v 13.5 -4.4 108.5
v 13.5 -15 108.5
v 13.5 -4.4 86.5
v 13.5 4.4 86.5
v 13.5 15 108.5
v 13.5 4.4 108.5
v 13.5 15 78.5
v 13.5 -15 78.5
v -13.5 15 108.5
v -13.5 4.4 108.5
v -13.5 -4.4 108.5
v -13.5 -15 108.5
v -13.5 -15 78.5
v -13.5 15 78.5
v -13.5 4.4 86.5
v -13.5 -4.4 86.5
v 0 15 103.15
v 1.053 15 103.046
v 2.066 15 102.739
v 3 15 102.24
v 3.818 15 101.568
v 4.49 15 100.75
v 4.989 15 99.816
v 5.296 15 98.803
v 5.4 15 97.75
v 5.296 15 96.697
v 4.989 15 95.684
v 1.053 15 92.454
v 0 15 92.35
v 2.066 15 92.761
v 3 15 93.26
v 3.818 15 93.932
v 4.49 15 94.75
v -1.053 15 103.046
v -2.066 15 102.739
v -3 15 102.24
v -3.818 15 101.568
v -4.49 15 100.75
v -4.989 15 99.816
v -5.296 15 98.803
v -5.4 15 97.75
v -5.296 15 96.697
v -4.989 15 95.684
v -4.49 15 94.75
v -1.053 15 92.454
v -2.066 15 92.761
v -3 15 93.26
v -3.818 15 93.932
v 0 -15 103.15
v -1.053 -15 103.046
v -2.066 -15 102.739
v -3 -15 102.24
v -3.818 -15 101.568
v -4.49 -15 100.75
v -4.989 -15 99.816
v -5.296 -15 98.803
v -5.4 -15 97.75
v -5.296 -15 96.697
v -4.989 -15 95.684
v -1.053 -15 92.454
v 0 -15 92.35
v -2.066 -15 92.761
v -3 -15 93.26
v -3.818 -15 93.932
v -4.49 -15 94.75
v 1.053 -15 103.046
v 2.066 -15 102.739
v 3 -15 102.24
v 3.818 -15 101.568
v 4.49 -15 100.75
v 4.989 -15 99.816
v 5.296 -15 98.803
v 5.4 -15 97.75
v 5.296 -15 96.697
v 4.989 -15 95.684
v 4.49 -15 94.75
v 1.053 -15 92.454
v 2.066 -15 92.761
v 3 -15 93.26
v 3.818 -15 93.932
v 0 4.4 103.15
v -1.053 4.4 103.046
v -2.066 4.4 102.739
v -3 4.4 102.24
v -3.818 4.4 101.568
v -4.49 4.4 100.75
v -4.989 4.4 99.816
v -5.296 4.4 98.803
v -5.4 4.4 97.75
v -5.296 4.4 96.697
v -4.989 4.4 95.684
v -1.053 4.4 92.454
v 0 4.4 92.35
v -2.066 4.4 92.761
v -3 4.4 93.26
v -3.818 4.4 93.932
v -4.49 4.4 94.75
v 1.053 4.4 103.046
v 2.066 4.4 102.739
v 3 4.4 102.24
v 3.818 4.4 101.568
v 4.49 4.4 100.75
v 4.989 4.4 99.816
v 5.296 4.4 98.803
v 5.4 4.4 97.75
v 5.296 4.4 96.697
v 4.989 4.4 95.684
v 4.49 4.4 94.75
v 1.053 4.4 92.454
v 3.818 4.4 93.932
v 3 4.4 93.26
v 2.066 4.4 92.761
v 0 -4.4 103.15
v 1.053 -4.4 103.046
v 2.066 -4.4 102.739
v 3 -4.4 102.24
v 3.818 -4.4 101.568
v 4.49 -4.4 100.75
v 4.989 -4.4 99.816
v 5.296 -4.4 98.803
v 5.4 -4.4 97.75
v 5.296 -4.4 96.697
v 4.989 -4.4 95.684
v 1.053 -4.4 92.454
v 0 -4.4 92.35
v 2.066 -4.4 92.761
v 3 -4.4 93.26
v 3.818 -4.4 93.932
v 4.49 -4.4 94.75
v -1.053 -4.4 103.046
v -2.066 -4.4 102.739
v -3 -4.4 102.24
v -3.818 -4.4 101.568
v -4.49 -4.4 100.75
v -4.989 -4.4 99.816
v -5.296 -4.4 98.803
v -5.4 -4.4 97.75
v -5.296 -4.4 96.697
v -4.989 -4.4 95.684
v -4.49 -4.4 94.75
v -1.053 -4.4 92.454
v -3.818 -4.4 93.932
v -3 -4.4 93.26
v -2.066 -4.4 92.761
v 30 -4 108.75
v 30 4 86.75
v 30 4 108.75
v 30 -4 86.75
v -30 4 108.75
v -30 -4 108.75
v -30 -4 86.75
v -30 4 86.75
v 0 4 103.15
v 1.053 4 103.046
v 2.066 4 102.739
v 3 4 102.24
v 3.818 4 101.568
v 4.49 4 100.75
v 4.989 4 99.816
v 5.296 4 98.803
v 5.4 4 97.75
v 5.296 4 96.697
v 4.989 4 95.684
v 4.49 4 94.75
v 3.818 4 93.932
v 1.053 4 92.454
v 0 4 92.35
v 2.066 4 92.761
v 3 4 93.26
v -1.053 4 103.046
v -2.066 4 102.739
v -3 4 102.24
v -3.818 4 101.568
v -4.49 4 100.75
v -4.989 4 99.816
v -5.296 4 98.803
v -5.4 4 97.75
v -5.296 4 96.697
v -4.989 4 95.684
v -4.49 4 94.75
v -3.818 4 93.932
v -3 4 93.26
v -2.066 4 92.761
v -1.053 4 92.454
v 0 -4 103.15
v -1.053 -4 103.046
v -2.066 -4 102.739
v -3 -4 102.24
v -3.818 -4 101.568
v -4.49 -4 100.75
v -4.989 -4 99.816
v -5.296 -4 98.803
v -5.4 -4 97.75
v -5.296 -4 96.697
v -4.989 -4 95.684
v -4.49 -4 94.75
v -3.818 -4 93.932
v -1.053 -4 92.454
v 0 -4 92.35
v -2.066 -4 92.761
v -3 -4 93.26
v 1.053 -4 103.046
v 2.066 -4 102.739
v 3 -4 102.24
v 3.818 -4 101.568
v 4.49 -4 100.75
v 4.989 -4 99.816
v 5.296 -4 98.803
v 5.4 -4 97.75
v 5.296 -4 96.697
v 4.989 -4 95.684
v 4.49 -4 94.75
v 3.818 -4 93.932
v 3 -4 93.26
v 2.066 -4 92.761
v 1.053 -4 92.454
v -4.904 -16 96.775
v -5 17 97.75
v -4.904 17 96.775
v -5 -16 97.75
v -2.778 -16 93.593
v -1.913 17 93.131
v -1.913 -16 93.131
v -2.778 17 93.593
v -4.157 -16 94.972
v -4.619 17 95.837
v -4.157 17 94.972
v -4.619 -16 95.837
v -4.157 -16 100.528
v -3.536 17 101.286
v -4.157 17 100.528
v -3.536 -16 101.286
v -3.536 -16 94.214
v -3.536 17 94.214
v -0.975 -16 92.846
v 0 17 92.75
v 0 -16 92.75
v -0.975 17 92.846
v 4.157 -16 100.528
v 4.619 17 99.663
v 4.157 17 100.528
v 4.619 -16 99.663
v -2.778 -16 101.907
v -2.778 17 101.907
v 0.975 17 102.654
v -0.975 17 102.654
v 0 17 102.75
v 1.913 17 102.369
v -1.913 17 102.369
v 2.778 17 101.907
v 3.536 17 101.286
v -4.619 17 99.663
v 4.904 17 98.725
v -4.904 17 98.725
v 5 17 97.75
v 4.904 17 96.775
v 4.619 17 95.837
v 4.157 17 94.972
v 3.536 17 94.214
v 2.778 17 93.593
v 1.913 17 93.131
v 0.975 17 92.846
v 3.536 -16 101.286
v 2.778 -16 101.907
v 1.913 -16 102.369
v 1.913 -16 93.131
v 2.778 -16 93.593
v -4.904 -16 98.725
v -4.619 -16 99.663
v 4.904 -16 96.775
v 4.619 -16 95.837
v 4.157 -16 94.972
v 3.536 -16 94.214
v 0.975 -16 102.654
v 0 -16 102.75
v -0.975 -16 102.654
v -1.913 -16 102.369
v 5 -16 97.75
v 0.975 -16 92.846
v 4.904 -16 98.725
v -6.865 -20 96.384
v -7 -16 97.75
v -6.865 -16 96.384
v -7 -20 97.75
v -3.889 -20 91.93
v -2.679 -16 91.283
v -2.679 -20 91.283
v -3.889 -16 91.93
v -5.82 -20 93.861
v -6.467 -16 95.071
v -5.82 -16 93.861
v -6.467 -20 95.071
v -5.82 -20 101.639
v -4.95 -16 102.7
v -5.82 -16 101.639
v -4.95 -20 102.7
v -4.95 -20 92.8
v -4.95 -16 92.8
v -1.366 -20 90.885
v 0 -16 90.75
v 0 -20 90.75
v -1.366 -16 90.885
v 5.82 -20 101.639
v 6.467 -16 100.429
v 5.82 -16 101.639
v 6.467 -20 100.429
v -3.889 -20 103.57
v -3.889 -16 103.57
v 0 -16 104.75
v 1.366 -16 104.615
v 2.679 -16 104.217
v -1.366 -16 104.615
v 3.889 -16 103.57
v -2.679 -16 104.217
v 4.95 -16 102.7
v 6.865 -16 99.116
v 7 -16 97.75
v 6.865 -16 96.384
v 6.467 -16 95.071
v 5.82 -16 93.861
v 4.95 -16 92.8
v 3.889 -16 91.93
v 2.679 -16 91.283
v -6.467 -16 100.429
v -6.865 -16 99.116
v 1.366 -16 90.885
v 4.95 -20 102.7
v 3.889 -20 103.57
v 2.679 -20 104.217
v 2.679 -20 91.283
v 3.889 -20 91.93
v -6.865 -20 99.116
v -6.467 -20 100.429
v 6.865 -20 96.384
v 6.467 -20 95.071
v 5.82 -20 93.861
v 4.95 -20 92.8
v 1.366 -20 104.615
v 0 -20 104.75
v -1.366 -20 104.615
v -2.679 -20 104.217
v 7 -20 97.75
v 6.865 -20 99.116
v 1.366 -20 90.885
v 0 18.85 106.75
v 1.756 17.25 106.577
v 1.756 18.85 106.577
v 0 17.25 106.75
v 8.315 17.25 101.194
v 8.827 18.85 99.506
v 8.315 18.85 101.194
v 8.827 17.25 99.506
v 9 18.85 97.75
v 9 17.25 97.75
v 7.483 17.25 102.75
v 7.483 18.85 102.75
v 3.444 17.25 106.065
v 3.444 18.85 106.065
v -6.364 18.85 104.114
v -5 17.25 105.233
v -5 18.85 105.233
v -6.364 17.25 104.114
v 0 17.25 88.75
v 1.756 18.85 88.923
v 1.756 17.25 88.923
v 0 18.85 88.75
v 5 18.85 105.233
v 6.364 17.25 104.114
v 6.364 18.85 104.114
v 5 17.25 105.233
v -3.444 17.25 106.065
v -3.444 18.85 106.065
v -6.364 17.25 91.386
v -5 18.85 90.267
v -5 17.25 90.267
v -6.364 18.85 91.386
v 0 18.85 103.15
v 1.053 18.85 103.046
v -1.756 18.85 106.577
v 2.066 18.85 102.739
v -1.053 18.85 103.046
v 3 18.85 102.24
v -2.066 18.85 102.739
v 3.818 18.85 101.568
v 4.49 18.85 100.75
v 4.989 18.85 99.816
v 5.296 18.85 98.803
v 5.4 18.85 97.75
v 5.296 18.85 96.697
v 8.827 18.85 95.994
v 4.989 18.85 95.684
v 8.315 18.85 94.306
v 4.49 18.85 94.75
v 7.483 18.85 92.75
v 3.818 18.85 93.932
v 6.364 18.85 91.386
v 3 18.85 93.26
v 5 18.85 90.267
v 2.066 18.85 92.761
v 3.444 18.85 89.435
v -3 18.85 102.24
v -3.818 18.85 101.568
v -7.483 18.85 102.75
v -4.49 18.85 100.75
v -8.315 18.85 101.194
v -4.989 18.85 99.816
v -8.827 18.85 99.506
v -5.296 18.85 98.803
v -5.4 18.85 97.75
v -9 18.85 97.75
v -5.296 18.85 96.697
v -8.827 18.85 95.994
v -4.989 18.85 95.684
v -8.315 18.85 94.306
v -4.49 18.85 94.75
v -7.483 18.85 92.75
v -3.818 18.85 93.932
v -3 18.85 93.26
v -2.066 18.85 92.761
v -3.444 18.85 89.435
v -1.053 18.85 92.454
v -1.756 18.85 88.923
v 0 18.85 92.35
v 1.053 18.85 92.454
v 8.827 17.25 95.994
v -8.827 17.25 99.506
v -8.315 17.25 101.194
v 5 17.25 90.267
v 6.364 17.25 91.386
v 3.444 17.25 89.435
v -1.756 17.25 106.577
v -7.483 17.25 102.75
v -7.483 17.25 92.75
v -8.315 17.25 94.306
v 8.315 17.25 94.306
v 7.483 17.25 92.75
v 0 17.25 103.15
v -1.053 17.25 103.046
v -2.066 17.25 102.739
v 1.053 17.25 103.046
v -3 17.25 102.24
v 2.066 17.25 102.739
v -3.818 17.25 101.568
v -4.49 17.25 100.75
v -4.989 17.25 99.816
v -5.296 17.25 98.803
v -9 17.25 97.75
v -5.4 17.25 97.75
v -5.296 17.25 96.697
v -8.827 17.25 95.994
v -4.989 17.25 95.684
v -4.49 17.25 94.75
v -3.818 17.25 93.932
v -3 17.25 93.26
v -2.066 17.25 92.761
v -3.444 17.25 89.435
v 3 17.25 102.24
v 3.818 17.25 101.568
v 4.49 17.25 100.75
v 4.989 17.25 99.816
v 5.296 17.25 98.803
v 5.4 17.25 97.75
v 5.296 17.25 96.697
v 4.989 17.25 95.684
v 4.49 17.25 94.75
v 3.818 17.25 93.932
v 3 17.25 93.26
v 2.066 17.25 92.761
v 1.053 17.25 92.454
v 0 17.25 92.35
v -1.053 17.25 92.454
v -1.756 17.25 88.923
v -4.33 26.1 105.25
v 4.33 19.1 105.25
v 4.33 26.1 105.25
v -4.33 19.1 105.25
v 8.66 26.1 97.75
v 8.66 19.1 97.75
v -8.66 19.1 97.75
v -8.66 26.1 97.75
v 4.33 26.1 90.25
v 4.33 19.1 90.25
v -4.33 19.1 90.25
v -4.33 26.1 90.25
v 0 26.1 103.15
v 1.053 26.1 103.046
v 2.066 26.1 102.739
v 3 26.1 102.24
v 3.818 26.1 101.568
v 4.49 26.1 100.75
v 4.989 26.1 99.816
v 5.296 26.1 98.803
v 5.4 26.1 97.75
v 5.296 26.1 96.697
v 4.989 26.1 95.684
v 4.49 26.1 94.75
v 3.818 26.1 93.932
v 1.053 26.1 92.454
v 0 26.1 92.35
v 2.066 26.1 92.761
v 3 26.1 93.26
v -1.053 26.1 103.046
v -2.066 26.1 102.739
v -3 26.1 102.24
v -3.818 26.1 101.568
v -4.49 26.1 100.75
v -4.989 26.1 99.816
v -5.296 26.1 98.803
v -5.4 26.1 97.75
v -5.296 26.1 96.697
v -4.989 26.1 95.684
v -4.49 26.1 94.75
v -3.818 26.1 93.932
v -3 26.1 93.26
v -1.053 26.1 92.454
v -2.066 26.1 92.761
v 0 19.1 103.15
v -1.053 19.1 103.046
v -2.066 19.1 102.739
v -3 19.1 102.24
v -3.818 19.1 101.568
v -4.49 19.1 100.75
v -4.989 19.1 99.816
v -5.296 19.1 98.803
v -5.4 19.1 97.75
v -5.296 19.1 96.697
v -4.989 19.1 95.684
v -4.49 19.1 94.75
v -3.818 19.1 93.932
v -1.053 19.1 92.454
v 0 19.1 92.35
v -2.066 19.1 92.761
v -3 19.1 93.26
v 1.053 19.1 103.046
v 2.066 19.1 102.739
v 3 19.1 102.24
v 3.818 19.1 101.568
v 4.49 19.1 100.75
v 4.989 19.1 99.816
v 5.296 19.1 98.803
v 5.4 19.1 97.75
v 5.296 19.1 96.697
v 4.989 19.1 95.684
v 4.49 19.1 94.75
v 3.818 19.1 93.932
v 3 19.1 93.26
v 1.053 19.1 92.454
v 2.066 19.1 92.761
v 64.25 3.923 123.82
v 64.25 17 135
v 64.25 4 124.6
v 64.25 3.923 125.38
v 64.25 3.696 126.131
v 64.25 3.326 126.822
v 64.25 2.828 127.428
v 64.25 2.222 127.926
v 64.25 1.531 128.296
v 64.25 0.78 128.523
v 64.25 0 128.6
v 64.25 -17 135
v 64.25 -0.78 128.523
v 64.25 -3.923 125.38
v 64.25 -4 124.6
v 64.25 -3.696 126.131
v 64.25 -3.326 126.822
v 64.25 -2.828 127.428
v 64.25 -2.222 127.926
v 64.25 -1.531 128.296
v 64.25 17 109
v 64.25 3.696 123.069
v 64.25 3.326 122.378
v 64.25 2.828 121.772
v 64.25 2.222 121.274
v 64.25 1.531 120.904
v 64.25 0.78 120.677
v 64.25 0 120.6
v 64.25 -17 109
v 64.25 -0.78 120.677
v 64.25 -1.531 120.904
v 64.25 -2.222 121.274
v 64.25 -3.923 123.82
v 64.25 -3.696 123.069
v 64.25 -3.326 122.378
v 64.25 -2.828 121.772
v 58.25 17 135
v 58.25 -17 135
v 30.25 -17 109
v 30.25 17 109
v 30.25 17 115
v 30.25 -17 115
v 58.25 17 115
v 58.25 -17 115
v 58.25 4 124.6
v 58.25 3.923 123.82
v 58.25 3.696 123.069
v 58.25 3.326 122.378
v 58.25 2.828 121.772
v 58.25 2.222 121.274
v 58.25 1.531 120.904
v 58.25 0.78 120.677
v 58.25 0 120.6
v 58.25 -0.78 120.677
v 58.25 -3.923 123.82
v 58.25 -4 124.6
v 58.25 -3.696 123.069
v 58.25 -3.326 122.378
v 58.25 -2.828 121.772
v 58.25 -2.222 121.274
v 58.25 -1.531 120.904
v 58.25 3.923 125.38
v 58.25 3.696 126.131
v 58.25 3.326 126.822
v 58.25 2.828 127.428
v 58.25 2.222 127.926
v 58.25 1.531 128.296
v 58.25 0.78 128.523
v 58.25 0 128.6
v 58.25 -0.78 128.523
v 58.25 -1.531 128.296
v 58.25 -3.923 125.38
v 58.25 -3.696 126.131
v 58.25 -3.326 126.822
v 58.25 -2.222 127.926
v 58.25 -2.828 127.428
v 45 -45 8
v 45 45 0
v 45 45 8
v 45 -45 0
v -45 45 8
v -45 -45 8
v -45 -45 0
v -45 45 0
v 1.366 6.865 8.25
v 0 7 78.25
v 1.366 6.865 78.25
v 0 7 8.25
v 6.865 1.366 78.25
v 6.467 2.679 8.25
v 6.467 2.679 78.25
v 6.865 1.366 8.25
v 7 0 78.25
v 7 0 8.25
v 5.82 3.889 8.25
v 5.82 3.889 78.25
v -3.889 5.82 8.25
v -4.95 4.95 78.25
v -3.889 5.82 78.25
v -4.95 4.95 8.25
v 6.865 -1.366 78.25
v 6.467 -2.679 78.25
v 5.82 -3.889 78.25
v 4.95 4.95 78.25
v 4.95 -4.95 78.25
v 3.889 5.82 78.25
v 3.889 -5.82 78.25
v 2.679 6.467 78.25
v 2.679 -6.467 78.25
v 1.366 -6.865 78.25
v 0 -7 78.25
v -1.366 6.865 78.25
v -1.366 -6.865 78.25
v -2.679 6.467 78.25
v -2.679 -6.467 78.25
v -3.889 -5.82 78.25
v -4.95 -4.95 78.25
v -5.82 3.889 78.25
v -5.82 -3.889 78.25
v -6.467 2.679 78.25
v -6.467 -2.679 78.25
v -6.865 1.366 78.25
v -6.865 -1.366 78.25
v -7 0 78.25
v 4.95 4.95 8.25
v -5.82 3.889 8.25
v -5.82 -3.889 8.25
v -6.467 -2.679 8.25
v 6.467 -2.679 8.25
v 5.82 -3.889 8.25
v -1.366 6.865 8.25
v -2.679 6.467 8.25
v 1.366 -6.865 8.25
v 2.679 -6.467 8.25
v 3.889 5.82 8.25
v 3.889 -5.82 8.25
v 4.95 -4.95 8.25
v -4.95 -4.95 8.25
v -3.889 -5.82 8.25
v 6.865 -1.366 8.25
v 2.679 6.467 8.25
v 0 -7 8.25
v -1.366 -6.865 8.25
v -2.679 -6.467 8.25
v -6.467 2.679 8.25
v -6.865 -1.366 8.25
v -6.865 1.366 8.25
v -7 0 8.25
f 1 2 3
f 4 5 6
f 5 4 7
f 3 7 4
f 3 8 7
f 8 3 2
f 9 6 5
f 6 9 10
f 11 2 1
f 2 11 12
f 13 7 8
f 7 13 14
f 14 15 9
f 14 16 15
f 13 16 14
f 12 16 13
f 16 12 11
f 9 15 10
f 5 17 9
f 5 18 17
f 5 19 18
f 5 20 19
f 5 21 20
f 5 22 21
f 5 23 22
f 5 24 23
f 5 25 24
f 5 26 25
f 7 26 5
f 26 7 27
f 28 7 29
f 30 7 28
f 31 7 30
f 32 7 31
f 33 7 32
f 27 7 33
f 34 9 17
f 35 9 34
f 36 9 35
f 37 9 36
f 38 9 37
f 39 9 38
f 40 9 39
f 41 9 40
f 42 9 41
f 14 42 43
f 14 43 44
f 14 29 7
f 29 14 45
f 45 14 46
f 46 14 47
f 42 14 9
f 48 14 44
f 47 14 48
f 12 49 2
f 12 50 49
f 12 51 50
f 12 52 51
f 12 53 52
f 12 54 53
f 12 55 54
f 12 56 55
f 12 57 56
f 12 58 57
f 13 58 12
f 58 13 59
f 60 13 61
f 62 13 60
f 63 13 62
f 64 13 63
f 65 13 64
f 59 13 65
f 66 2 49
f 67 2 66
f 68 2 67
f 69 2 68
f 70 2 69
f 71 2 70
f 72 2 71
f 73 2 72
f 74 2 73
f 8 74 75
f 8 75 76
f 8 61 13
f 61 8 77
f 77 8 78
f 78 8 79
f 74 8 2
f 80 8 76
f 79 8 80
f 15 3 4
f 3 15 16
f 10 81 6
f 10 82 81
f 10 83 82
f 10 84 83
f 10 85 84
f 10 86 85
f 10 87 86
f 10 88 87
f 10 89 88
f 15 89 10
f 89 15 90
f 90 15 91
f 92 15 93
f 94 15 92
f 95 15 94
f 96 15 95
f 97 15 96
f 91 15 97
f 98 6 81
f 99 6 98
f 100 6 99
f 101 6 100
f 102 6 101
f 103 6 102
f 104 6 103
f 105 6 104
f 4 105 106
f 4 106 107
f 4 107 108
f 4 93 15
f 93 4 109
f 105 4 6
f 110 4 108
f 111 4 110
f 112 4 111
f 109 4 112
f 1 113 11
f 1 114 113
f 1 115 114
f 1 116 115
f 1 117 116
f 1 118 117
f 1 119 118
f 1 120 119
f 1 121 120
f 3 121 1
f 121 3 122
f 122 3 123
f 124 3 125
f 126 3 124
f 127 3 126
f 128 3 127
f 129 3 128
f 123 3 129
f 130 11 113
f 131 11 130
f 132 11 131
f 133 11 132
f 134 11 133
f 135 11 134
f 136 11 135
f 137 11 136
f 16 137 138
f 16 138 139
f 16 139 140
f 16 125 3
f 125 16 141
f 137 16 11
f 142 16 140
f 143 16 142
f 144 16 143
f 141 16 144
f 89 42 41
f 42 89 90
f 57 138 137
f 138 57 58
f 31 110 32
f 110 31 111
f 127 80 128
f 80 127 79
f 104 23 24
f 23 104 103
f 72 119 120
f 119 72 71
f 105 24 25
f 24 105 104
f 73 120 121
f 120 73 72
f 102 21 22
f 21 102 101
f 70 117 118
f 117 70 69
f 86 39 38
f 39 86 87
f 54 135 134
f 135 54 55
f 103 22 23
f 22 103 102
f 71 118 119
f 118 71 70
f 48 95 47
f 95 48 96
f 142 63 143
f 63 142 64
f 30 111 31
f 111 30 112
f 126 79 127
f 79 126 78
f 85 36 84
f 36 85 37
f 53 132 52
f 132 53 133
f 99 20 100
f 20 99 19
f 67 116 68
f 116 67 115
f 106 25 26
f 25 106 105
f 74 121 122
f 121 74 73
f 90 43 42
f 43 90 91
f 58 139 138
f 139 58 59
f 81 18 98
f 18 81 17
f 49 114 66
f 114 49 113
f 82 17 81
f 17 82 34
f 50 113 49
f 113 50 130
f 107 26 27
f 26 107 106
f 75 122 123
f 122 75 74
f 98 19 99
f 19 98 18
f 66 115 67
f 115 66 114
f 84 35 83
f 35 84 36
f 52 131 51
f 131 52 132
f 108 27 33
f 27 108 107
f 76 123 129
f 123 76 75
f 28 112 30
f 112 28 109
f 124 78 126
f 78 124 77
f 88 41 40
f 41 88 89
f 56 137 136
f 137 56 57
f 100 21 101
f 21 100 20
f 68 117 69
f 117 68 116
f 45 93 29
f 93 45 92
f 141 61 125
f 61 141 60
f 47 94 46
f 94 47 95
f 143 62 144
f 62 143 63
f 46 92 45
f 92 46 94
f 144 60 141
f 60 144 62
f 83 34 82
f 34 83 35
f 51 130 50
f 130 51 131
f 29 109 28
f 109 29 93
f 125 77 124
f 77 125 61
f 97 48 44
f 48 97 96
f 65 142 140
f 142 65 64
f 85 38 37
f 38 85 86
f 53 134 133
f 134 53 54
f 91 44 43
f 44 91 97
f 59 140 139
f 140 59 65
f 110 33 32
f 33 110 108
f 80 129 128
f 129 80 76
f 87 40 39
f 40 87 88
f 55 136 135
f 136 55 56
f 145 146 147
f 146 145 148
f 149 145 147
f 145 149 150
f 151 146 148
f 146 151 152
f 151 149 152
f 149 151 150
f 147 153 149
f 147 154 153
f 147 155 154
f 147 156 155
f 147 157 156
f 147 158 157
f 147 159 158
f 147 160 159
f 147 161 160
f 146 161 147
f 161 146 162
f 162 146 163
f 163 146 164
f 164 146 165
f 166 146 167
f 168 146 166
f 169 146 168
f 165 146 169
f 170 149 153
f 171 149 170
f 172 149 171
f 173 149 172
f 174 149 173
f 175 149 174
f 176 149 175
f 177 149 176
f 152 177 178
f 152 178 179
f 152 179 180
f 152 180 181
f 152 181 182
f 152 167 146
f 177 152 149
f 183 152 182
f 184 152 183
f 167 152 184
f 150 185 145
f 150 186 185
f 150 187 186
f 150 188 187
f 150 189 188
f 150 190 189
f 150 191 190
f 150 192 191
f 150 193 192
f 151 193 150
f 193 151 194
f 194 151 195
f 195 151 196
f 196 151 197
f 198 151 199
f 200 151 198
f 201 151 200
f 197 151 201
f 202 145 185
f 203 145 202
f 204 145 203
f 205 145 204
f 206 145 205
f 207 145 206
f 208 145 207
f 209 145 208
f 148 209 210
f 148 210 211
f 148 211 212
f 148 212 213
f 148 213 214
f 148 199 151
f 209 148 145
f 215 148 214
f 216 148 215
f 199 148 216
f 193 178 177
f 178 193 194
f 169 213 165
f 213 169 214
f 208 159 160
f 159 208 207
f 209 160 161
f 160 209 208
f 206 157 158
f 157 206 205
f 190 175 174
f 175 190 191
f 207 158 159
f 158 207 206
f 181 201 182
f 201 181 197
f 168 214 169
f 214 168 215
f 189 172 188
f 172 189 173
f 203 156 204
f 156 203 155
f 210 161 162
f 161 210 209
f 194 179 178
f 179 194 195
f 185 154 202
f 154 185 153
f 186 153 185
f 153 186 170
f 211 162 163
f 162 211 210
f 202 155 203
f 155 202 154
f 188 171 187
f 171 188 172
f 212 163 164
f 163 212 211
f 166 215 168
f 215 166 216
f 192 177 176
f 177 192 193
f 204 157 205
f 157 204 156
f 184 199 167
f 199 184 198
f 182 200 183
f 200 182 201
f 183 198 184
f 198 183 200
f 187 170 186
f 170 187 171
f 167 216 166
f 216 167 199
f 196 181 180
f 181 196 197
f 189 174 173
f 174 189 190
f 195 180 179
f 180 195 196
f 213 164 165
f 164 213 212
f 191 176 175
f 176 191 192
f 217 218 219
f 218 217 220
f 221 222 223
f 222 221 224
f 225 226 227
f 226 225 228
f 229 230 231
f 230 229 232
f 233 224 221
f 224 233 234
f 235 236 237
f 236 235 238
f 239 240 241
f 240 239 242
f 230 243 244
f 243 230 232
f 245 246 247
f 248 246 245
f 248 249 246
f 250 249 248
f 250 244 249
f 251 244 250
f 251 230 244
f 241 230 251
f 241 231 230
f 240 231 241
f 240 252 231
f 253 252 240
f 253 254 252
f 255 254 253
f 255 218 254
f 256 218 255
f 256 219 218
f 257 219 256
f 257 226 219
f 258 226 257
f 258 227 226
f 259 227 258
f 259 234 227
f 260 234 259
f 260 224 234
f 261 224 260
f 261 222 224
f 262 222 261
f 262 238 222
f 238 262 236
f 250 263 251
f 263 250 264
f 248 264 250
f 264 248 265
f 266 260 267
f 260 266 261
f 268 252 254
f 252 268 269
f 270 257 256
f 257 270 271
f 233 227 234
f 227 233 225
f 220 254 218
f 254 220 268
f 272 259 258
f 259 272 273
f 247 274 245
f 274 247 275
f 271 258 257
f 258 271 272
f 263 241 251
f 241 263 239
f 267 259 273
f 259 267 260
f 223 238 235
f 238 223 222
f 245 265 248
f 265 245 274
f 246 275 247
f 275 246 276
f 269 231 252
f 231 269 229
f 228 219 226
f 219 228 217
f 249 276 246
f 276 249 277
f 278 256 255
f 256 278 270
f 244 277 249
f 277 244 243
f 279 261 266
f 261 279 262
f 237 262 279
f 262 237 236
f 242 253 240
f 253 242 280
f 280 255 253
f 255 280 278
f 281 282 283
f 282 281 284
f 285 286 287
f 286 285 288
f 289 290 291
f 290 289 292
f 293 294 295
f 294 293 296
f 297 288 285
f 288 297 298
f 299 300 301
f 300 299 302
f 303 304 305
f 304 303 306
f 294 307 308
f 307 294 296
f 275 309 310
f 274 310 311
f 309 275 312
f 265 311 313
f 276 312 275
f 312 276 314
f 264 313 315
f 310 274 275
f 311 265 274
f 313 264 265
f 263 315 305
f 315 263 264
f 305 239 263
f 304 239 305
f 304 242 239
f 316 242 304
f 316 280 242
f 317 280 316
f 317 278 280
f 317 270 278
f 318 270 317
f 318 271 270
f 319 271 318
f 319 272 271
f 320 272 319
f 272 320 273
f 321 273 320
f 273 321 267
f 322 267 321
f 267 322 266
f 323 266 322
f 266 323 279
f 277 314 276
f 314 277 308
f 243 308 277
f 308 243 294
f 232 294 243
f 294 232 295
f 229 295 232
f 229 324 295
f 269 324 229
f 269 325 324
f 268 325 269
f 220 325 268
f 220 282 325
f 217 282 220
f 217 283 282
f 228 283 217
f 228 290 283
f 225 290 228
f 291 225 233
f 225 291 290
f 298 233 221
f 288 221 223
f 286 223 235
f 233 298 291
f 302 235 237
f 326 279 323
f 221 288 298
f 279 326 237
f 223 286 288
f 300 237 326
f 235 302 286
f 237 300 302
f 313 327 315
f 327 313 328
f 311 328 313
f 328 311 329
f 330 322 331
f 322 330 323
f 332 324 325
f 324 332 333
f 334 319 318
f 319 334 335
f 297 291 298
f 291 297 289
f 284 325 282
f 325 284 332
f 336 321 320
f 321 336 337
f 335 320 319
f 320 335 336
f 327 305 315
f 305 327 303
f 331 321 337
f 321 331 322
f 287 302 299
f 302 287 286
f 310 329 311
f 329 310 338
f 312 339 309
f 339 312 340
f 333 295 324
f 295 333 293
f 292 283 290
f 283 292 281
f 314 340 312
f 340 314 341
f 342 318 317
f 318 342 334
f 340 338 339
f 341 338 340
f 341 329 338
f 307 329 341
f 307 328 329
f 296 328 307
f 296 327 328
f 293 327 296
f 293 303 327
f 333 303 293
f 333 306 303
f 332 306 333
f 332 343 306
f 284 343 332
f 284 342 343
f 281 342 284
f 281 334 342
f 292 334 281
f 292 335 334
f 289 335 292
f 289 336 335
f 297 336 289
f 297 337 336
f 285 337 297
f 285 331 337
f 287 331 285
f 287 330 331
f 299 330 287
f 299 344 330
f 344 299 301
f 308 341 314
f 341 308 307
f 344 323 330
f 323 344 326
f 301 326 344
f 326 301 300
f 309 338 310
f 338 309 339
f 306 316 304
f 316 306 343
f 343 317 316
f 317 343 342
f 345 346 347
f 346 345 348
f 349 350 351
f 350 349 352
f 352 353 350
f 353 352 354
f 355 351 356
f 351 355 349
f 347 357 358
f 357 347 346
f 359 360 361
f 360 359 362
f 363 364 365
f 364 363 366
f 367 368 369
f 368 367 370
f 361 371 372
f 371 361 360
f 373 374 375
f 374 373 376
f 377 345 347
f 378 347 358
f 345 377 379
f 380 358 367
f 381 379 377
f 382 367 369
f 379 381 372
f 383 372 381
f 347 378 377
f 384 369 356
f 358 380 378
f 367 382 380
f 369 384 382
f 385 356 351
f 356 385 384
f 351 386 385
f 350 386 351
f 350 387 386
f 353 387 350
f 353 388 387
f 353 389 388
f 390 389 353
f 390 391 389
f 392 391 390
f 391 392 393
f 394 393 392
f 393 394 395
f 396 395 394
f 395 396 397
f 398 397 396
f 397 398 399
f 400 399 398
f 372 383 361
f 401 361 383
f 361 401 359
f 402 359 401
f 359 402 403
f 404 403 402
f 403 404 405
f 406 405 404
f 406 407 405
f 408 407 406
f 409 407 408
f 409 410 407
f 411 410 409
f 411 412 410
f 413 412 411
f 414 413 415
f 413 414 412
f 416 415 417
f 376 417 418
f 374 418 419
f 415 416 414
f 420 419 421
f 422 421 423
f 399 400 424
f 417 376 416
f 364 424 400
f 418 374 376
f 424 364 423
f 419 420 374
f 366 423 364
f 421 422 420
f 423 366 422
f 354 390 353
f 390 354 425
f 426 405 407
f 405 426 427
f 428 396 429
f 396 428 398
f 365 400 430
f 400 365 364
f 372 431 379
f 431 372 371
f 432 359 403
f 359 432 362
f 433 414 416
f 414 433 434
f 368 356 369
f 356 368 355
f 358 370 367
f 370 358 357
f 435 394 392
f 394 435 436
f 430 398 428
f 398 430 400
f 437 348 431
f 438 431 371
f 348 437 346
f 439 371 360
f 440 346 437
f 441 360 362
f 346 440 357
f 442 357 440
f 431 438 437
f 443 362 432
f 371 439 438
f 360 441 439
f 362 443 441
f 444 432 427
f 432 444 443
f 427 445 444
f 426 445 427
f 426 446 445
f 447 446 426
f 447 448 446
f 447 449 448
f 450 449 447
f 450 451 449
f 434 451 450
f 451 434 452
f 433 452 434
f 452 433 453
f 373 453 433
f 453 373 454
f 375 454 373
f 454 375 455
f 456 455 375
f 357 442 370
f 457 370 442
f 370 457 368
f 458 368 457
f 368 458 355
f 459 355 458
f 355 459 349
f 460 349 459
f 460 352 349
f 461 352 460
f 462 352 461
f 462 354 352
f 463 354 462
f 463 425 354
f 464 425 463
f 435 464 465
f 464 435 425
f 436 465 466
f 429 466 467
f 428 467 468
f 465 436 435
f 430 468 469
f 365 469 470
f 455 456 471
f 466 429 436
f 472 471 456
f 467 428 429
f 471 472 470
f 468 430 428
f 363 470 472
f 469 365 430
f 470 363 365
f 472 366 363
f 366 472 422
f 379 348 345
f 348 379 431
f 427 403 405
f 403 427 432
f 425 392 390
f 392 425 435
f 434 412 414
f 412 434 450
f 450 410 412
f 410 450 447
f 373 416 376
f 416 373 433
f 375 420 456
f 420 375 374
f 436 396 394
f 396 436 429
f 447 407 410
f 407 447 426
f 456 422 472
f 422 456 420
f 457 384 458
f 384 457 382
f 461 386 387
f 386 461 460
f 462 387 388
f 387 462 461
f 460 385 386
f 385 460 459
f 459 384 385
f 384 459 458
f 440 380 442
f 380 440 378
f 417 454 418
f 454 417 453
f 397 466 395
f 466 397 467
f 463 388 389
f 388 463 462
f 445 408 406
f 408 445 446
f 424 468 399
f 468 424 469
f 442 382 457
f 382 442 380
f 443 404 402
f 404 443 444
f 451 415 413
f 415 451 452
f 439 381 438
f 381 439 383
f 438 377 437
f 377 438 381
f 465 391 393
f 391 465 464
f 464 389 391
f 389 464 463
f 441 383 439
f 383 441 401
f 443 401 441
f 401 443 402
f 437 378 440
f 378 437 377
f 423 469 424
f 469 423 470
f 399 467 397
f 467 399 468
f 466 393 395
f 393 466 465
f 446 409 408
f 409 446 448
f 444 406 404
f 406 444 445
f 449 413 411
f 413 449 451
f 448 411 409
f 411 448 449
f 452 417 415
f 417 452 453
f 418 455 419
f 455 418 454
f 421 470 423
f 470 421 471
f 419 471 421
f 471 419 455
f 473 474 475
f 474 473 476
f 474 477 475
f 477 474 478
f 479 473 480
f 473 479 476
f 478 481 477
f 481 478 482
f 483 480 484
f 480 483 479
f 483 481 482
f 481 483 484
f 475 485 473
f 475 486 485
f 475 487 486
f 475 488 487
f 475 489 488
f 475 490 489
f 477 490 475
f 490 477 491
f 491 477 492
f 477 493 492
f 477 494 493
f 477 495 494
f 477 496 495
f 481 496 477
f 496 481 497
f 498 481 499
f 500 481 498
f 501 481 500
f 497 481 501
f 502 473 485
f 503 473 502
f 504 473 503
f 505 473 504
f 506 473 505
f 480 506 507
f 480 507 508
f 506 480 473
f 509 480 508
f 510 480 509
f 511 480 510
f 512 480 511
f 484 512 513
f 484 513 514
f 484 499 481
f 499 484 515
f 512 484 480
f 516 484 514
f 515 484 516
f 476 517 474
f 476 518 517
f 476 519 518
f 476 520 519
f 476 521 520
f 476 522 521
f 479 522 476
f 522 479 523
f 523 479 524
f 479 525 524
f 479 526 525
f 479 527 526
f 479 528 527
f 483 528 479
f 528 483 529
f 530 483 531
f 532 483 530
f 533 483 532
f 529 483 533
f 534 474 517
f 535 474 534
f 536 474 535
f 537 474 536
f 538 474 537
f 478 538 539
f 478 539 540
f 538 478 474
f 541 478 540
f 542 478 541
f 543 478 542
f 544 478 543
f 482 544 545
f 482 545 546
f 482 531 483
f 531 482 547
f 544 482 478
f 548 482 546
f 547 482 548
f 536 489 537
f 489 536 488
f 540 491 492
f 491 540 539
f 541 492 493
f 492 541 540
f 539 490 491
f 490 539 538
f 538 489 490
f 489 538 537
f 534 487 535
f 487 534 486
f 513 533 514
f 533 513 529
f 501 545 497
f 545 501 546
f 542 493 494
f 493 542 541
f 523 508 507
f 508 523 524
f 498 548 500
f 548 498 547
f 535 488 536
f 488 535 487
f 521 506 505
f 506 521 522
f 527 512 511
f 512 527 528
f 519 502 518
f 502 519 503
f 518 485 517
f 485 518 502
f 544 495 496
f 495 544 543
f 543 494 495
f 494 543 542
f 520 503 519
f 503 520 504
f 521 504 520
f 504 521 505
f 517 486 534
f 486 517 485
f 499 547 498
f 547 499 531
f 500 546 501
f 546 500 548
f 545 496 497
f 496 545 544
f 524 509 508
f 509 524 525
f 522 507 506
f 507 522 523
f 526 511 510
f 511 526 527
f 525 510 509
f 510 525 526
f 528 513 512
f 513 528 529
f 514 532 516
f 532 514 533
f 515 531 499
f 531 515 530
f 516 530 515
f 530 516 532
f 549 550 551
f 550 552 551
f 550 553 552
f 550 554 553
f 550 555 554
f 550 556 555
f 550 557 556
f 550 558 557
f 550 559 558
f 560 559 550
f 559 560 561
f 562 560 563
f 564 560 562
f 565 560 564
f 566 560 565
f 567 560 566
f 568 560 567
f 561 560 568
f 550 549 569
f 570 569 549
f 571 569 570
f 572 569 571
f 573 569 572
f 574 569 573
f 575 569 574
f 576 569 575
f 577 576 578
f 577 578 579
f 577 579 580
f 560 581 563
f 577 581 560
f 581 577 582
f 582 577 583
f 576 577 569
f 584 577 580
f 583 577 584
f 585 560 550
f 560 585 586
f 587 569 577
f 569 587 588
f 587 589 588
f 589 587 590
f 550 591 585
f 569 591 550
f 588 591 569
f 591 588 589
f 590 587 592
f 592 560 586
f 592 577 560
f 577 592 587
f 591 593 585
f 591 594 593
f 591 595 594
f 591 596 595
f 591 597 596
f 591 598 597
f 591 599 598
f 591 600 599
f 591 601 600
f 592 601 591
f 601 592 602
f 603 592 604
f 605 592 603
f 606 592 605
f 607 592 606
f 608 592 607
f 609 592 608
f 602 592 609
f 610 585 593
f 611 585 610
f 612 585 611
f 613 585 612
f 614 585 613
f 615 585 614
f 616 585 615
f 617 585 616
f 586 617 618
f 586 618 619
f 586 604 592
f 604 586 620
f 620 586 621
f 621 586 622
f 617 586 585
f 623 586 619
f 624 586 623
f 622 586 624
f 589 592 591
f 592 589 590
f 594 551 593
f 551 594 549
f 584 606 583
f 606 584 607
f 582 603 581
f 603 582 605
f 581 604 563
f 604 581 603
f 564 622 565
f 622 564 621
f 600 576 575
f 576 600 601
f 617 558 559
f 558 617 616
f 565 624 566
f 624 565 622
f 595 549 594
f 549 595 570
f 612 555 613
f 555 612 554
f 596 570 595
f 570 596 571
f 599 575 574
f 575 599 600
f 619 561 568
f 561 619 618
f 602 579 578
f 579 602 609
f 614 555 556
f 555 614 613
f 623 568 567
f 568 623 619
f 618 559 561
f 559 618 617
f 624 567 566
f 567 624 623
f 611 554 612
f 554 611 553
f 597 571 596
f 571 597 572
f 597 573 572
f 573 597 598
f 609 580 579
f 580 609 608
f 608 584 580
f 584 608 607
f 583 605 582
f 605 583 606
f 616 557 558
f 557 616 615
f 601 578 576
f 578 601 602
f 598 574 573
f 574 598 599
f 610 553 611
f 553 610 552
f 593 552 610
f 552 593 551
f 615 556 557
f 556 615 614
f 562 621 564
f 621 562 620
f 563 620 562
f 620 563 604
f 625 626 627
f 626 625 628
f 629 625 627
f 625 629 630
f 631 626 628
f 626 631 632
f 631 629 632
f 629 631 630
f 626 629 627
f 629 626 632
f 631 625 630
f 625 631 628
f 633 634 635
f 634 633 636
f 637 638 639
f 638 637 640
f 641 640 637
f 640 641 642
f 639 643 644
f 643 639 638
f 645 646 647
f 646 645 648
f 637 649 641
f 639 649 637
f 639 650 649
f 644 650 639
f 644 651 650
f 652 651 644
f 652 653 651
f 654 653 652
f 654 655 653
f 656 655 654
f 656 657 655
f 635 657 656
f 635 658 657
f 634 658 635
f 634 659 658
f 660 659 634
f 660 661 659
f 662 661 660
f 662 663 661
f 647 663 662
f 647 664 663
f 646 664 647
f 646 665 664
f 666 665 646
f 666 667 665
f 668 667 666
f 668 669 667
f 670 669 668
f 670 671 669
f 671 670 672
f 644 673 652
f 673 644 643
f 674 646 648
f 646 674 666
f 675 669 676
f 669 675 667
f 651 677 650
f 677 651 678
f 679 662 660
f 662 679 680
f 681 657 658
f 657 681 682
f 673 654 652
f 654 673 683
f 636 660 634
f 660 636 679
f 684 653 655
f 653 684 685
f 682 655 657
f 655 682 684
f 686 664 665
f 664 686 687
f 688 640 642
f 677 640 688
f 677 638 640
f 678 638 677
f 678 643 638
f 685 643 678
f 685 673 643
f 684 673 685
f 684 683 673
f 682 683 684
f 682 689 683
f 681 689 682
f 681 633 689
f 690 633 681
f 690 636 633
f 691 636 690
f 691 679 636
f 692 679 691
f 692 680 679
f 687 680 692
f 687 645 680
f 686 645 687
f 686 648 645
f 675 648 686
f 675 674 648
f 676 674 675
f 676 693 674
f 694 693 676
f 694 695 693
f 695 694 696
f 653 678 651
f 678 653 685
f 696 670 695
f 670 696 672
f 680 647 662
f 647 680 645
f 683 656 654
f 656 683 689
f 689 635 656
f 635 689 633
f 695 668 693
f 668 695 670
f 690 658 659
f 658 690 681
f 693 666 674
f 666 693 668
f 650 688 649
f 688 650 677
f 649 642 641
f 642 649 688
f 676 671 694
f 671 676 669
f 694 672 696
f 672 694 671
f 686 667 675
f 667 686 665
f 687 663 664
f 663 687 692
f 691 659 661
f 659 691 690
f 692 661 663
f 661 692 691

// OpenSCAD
$fn = 32;

// ------------------------------------------------------------------------
// Lamp arm: column d14 x 70 mm, arm 60 mm
// Every part is its own module, assembly() places every instance.
// ------------------------------------------------------------------------

// --- part 1 ---
module lamp_base() {
  difference() {
    translate([-45, -45, 0]) cube([90, 90, 8]);
  }
}

// --- part 2 ---
module lamp_column() {
  cylinder(h = 70, d = 14);
}

// --- part 3 ---
module head_fork() {
  difference() {
    translate([-13.5, -15, 0]) cube([27, 30, 30]);
    translate([-14.5, -4.4, 8]) cube([29, 8.8, 23]);
    translate([0, 0, 19.25]) rotate([90, 0, 0]) cylinder(h = 32, d = 10.8, center = true);
  }
}

// --- part 4 ---
module lamp_arm() {
  difference() {
    translate([-30, -4, 0]) cube([60, 8, 22]);
    translate([0, 0, 11]) rotate([90, 0, 0]) cylinder(h = 10, d = 10.8, center = true);
  }
}

// --- part 5 ---
module arm_pin() {
  rotate([0, 90, 0]) cylinder(h = 34, d = 10, center = true);
  translate([-20, 0, 0]) rotate([0, 90, 0]) cylinder(h = 4, d = 14);
}

// --- part 6 ---
module arm_washer() {
  difference() {
      translate([0, 0, 0]) cylinder(h = 1.6, d = 18);
      translate([0, 0, -1]) cylinder(h = 3.6, d = 10.8);
    }
}

// --- part 7 ---
module arm_nut() {
  difference() {
    linear_extrude(height = 7) polygon(points = [[8.66, 0], [4.33, 7.5], [-4.33, 7.5], [-8.66, 0], [-4.33, -7.5], [4.33, -7.5]]);
    translate([0, 0, -1]) cylinder(h = 9, d = 10.8);
  }
}

// --- part 8 ---
module shade_bracket() {
  difference() {
    translate([-17, -17, 0]) cube([34, 34, 26]);
    translate([-18, -18, 6]) cube([29, 36, 21]);
    translate([14, 0, 15.6]) rotate([0, 90, 0]) cylinder(h = 8, d = 8, center = true);
  }
}

// --- assembly ---
module assembly() {
  color([0.80, 0.24, 0.20]) translate([0, 0, 0]) rotate([0, 0, 0]) lamp_base();
  color([0.20, 0.45, 0.75]) translate([0, 0, 8.25]) rotate([0, 0, 0]) lamp_column();
  color([0.25, 0.62, 0.32]) translate([0, 0, 78.5]) rotate([0, 0, 0]) head_fork();
  color([0.92, 0.70, 0.18]) translate([0, 0, 86.75]) rotate([0, 0, 0]) lamp_arm();
  color([0.58, 0.35, 0.70]) translate([0, 0, 97.75]) rotate([0, 0, 90]) arm_pin();
  color([0.16, 0.66, 0.66]) translate([0, 18.85, 97.75]) rotate([90, 0, 0]) arm_washer();
  color([0.85, 0.48, 0.18]) translate([0, 26.1, 97.75]) rotate([90, 0, 0]) arm_nut();
  color([0.55, 0.60, 0.65]) translate([47.25, 0, 109]) rotate([0, 0, 0]) shade_bracket();
}

assembly();
